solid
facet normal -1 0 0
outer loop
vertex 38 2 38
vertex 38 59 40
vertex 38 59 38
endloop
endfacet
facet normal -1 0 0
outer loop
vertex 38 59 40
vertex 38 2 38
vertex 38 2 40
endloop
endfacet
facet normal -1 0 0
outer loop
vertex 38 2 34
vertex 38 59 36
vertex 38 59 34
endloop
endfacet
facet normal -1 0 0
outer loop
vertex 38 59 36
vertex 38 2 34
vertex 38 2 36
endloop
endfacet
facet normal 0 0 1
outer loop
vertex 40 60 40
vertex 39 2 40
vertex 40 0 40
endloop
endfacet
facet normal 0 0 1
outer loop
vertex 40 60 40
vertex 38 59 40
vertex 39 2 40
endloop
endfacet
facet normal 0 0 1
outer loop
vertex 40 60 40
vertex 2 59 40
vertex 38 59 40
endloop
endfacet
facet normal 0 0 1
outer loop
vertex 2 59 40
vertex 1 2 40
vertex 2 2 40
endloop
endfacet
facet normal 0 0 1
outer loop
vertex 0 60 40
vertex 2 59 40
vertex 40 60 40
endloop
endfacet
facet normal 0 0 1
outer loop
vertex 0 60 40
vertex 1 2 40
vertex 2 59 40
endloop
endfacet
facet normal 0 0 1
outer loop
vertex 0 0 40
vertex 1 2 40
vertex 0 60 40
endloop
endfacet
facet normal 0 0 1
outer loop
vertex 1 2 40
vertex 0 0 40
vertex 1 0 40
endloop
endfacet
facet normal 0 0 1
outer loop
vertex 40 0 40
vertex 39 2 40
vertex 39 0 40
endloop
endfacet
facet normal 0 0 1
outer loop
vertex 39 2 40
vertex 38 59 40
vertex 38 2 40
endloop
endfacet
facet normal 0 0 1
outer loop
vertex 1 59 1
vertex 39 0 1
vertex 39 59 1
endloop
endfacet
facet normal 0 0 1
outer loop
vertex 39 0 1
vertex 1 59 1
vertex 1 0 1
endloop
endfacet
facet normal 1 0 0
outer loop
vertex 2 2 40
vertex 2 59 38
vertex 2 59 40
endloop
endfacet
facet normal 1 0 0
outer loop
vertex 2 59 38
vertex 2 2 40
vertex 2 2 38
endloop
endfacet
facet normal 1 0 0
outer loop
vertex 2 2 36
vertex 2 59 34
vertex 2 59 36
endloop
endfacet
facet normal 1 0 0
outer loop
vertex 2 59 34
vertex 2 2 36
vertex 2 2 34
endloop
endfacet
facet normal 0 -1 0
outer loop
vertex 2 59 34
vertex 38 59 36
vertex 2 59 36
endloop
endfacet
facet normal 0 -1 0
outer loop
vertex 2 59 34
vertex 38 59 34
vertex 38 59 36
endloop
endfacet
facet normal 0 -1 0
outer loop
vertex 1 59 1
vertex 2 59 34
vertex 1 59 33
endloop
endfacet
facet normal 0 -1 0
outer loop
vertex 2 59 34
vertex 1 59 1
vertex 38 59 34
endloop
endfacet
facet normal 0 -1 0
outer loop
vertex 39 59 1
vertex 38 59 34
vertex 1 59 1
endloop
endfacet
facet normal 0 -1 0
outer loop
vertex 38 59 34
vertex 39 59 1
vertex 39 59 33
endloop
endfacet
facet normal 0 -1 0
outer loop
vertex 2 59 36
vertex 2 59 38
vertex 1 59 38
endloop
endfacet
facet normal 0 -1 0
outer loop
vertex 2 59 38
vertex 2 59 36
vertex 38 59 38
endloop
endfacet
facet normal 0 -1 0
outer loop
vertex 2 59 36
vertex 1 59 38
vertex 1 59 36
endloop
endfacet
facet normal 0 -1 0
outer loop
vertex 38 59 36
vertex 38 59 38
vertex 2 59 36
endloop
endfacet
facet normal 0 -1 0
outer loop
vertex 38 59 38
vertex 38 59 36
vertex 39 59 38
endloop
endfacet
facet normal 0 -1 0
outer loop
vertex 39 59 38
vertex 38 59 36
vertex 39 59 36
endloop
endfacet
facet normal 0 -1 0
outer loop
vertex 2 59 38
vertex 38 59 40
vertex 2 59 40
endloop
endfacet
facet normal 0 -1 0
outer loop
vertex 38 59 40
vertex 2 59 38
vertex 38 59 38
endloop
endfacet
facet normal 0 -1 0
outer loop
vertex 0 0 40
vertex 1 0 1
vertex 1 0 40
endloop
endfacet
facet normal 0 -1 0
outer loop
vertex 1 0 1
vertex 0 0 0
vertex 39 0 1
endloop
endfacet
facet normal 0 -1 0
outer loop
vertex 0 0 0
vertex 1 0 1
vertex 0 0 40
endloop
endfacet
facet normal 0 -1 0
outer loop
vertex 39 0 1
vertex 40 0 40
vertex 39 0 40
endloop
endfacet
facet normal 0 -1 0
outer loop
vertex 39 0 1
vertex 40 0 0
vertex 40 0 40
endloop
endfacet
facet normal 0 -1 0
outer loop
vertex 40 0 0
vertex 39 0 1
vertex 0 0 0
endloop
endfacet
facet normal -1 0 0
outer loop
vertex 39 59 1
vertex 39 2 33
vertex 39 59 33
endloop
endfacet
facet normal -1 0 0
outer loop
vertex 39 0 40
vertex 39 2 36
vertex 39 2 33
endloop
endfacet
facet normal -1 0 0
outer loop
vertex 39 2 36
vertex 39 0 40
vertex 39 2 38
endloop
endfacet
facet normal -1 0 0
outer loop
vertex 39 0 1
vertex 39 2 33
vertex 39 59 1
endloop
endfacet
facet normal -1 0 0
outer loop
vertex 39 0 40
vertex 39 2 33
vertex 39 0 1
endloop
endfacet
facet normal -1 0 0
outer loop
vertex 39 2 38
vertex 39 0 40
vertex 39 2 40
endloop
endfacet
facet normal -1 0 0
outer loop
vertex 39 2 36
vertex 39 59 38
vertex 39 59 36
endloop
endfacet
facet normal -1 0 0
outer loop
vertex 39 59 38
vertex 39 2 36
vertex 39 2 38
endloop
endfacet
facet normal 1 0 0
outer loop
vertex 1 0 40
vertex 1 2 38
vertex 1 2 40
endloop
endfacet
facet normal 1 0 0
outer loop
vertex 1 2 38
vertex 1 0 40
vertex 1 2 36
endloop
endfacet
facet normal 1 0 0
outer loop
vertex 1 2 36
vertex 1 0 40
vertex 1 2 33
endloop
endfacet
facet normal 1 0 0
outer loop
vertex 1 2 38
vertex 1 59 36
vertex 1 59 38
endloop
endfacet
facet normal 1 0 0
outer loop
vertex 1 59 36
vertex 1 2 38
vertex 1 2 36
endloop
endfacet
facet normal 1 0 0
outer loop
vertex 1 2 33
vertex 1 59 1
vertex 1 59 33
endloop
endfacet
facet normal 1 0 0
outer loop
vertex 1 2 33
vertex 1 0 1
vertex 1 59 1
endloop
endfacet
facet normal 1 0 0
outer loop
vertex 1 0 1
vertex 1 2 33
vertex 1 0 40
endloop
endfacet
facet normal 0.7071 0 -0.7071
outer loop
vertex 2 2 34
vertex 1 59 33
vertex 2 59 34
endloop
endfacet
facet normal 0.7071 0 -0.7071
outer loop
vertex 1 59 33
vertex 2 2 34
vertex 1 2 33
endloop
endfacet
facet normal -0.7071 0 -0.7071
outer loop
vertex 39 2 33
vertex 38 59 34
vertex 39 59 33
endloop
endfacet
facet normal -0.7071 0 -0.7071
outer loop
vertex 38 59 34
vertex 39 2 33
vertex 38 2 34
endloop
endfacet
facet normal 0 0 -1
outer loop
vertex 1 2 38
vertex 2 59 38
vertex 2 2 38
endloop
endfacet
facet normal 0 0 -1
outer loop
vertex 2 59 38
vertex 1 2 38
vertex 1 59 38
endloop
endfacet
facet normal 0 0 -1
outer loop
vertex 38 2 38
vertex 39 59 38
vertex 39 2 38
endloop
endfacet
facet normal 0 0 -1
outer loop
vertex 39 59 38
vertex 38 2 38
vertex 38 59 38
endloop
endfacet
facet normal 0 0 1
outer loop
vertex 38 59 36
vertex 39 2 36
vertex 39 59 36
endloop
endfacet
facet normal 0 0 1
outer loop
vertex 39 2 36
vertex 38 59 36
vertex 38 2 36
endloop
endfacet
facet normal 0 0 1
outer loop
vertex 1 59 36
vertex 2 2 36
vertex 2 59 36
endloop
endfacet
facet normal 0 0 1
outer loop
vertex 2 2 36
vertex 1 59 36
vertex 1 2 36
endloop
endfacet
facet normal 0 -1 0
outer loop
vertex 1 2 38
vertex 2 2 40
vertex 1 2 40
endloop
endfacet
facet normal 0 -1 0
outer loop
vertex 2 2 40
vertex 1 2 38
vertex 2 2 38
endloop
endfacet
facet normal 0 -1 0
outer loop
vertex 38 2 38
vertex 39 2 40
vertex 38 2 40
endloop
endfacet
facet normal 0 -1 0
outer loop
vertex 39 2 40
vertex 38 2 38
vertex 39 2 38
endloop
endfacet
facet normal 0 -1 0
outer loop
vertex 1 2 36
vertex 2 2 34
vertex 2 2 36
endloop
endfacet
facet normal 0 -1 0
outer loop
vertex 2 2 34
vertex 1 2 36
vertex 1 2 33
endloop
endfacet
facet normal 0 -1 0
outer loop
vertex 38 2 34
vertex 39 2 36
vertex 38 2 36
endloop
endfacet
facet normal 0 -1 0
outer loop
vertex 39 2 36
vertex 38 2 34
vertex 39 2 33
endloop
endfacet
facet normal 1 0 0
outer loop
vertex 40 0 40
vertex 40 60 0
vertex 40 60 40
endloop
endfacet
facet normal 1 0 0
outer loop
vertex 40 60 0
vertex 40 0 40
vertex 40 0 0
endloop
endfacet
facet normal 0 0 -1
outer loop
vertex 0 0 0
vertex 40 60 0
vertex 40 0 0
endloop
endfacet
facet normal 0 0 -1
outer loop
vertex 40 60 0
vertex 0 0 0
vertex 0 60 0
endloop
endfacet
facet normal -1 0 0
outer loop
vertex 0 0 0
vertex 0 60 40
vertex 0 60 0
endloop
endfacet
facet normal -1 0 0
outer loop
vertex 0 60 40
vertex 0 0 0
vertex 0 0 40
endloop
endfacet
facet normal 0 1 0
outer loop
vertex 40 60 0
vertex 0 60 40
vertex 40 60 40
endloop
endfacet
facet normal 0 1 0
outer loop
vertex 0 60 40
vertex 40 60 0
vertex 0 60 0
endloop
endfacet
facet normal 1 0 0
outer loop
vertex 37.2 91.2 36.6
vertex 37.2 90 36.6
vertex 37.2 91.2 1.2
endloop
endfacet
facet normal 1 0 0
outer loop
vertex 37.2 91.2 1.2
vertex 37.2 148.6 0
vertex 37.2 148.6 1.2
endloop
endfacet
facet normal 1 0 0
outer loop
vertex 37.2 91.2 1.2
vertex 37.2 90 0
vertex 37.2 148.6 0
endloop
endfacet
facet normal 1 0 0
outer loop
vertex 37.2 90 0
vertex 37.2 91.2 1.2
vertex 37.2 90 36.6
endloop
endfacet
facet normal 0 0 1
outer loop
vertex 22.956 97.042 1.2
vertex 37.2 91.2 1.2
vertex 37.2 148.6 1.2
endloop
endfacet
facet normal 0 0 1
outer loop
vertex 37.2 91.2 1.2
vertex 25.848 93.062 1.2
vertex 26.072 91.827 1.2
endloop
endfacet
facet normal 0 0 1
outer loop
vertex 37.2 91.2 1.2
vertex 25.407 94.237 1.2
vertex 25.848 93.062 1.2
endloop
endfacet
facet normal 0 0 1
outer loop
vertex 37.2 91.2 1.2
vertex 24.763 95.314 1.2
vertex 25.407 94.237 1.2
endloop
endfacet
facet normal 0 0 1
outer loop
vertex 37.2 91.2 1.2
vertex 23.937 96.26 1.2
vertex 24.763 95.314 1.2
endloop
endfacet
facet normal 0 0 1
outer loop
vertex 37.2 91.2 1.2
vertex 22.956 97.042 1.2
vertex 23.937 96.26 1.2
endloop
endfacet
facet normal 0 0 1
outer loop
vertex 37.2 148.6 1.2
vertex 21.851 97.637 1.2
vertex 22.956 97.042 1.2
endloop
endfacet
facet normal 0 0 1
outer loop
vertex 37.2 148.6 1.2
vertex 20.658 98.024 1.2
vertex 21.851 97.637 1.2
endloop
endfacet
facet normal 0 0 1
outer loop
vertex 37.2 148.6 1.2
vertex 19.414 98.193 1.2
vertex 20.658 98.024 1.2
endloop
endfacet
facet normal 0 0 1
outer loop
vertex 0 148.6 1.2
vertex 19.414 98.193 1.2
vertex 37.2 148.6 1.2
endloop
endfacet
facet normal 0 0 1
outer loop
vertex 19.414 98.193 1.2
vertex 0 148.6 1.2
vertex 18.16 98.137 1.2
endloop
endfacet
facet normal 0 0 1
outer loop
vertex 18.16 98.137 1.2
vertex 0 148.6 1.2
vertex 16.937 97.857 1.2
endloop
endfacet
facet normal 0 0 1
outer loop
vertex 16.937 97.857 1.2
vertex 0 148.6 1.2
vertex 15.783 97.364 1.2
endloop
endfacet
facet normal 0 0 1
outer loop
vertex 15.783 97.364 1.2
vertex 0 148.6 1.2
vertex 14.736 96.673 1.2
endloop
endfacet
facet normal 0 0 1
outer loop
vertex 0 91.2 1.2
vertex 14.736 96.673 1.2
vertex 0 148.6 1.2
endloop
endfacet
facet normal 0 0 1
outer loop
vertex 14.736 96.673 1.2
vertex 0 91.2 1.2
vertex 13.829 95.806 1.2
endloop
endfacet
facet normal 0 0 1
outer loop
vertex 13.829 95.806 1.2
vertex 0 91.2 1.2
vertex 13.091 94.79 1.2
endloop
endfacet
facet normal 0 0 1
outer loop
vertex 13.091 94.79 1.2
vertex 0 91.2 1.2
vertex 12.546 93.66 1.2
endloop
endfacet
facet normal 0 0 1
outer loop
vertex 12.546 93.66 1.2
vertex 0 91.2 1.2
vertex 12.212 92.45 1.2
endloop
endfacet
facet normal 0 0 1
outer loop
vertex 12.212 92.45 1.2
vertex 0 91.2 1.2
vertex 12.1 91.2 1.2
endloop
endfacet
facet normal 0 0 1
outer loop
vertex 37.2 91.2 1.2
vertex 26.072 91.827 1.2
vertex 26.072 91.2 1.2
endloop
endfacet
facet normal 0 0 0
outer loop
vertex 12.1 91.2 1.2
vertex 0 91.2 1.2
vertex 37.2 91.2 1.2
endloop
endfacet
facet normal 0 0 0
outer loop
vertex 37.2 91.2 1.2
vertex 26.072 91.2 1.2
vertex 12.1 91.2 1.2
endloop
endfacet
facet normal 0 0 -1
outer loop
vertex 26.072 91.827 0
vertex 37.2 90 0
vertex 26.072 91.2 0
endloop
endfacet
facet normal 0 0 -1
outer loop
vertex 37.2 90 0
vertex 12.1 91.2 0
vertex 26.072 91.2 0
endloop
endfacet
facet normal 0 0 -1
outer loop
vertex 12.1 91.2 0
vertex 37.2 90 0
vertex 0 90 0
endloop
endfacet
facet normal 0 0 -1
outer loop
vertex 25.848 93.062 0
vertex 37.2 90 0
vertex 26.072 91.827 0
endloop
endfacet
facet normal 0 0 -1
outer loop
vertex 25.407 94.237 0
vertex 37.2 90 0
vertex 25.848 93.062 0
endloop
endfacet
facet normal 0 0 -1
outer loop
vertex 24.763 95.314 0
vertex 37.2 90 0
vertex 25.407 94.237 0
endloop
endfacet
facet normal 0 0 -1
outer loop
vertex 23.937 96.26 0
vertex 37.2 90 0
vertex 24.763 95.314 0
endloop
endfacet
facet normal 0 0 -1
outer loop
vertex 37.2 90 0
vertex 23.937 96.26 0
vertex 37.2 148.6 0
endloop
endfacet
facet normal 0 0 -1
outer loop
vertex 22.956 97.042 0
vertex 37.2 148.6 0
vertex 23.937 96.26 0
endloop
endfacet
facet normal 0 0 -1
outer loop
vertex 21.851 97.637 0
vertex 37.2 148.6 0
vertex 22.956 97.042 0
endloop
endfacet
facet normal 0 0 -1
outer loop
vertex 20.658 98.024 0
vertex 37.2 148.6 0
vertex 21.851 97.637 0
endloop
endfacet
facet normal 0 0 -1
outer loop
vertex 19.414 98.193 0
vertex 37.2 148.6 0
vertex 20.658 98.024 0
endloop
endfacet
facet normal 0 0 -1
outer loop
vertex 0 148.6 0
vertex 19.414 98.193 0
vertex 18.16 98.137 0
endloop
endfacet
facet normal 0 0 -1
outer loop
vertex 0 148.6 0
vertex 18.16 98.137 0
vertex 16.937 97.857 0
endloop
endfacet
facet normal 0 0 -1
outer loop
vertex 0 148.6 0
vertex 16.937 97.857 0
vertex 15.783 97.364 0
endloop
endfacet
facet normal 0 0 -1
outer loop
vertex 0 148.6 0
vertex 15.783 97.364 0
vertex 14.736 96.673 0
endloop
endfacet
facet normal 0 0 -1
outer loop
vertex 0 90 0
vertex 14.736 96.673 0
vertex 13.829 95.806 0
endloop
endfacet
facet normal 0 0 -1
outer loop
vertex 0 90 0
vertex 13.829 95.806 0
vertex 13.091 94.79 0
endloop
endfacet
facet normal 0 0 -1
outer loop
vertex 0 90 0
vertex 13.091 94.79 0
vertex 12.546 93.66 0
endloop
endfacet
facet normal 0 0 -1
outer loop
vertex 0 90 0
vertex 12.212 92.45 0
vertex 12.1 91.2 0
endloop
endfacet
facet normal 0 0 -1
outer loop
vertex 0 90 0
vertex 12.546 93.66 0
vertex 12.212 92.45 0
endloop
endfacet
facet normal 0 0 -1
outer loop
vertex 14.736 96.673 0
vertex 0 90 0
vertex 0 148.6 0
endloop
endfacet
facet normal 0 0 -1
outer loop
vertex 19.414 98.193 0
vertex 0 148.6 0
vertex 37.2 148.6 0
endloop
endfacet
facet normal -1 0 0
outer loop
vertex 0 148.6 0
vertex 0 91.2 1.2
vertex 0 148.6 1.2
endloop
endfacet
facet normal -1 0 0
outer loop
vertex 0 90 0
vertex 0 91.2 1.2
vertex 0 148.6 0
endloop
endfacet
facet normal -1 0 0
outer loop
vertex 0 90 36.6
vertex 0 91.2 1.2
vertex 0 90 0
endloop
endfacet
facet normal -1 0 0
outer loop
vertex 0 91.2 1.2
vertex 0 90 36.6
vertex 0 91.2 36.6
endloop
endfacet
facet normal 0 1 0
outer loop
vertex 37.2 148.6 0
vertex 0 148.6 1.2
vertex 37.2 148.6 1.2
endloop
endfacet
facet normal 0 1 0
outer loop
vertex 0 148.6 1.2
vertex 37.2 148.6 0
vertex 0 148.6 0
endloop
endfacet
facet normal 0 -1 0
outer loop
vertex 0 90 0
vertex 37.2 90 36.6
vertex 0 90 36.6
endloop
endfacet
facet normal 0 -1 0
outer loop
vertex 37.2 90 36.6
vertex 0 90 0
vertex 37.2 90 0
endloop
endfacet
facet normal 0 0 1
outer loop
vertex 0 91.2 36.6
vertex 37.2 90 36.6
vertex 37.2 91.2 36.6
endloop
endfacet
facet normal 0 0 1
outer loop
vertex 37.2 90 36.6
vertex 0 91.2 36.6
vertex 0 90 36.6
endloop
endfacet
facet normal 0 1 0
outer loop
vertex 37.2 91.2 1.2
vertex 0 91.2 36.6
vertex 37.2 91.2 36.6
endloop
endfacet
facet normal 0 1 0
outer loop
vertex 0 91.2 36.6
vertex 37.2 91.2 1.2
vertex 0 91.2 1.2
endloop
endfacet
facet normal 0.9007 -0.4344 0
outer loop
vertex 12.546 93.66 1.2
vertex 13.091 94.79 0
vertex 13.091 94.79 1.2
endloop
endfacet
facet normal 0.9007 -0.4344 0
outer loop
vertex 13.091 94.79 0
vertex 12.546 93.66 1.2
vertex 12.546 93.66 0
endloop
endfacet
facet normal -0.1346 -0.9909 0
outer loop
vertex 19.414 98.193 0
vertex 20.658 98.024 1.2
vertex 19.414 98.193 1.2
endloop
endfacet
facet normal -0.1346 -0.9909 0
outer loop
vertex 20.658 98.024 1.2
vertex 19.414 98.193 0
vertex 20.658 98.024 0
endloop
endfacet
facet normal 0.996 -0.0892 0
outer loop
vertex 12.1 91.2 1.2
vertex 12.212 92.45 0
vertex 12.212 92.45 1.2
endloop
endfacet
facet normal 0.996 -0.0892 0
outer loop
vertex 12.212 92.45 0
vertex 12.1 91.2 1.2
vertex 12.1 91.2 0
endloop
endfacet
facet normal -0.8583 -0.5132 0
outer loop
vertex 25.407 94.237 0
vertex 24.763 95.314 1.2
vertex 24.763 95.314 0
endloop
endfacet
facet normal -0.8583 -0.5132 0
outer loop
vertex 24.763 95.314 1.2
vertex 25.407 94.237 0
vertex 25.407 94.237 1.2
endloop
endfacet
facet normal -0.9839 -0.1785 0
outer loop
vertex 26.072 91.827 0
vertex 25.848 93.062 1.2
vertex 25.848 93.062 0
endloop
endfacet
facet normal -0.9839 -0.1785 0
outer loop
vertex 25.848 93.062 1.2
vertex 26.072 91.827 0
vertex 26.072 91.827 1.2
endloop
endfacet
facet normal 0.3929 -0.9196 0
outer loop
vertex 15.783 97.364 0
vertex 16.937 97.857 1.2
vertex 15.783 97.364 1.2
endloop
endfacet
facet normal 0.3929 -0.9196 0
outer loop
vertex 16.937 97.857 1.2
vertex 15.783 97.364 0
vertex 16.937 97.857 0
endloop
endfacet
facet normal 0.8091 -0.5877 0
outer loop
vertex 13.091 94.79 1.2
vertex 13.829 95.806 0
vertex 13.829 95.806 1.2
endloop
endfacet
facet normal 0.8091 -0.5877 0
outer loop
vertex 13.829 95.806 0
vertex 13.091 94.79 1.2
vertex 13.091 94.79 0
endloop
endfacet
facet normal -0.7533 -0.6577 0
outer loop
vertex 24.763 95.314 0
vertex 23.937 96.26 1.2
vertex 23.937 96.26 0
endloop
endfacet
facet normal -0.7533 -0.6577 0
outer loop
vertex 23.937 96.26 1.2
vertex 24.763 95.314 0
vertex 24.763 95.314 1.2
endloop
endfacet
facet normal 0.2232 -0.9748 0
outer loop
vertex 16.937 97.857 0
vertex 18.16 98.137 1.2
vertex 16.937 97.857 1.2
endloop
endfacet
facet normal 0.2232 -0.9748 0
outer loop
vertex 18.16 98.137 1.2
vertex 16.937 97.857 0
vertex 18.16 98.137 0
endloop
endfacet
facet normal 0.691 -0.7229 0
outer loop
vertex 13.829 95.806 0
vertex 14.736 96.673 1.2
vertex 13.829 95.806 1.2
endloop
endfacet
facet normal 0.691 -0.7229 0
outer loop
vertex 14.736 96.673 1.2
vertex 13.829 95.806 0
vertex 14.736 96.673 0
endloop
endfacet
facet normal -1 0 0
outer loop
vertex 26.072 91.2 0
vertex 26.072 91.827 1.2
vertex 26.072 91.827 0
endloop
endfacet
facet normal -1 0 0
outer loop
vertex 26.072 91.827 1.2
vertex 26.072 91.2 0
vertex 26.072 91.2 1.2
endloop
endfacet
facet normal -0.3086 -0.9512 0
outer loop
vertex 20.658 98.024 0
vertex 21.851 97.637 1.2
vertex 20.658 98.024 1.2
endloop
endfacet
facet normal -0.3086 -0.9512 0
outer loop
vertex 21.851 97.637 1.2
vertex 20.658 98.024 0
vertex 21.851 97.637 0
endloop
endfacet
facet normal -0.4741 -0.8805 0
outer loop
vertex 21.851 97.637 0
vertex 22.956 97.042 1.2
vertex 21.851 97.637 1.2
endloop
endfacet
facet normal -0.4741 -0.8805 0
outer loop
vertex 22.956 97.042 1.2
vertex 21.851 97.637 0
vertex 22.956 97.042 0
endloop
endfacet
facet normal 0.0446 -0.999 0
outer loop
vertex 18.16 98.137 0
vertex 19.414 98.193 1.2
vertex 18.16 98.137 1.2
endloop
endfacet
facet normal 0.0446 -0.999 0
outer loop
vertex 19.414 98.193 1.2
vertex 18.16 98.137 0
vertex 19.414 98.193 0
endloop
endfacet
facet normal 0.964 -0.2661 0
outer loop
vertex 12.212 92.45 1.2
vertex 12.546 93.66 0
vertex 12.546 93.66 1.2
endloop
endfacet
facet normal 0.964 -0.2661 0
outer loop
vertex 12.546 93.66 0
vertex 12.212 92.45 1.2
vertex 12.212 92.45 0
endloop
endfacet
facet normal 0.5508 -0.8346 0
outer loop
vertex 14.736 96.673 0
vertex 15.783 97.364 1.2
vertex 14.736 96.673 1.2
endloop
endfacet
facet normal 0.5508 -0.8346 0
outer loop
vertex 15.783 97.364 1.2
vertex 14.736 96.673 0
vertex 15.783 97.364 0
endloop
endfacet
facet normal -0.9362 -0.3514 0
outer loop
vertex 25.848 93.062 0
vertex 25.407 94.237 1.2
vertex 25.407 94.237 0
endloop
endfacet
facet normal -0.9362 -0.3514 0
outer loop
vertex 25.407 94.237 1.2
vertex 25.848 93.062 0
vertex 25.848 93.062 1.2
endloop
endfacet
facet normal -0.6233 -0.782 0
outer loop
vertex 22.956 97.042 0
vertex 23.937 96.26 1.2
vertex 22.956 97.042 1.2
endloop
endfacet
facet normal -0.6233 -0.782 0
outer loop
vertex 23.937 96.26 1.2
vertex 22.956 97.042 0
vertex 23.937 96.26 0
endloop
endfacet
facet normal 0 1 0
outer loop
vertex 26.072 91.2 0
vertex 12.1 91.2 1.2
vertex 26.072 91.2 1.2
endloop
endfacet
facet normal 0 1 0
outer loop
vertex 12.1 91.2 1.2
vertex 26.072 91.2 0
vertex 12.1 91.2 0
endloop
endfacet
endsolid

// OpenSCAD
//[ Parametric box w/slidable lid v.1 ]
//written by: Hermes Alvarado <hermesalvarado@gmail.com>

//parameters:
width = 40;
length = 60;
height = 40;
lidthickness = 2;
thickness = 1; //
bottomthickness = 1;
raildepth = 1;
tolerance = 0.4;
drawerpullerradius = 7;
resolution = 35;

//Generators:
module boxmainsubs(){
polygon(points=[[thickness,bottomthickness],[width-thickness,bottomthickness],[width-thickness,height-bottomthickness-lidthickness*3],[width-thickness-lidthickness,height-bottomthickness-lidthickness*3+lidthickness],[thickness+lidthickness,height-bottomthickness-lidthickness*3+lidthickness],[thickness,height-bottomthickness-lidthickness*3]],paths=[[0,1,2,3,4,5]],convexity=10);
}
module mainbox(){
    difference(){
        cube([width,length,height]);
        union(){
        translate([raildepth+thickness,0,bottomthickness]){
            cube([width-thickness*2-raildepth*2,length-thickness,height-bottomthickness]);
        }
        translate([0,length-thickness,0]){
            rotate([90,0,0]){
                linear_extrude(height=length-thickness,center=false,convexity=10){
                    boxmainsubs();
                }
            }
        }
        translate([thickness,0,height-lidthickness*2]){
            cube([width-thickness*2,length-thickness,lidthickness]); //rail
            }
        translate([thickness,0,bottomthickness]){
            cube([width-thickness*2,lidthickness,height-bottomthickness]); //side
        }

        }
    }
}
module puller(){
    difference(){
        cylinder(h=lidthickness-tolerance*2,r=drawerpullerradius,$fn=resolution);
        translate([0,drawerpullerradius,(lidthickness-tolerance*2)/2]){
            cube([drawerpullerradius*2,drawerpullerradius*2,lidthickness-tolerance*2],true);
            }
        }
    }

module slidelid(){
    difference(){
    union(){
    translate([0,length*1.5,0]){
            cube([width-thickness*2-tolerance*2,length-thickness-tolerance,lidthickness-tolerance*2]);
        }
        translate([0,length*1.5,0]){
            cube([width-thickness*2-tolerance*2,lidthickness-tolerance*2,height-bottomthickness-lidthickness-tolerance]);
            }
            }
                translate([(width-thickness-tolerance*2)/2,length*1.5+lidthickness-tolerance*2,0]){
                    rotate([0,0,180]){
                       puller();
                    }
                }
            }
        }

mainbox();
slidelid();
